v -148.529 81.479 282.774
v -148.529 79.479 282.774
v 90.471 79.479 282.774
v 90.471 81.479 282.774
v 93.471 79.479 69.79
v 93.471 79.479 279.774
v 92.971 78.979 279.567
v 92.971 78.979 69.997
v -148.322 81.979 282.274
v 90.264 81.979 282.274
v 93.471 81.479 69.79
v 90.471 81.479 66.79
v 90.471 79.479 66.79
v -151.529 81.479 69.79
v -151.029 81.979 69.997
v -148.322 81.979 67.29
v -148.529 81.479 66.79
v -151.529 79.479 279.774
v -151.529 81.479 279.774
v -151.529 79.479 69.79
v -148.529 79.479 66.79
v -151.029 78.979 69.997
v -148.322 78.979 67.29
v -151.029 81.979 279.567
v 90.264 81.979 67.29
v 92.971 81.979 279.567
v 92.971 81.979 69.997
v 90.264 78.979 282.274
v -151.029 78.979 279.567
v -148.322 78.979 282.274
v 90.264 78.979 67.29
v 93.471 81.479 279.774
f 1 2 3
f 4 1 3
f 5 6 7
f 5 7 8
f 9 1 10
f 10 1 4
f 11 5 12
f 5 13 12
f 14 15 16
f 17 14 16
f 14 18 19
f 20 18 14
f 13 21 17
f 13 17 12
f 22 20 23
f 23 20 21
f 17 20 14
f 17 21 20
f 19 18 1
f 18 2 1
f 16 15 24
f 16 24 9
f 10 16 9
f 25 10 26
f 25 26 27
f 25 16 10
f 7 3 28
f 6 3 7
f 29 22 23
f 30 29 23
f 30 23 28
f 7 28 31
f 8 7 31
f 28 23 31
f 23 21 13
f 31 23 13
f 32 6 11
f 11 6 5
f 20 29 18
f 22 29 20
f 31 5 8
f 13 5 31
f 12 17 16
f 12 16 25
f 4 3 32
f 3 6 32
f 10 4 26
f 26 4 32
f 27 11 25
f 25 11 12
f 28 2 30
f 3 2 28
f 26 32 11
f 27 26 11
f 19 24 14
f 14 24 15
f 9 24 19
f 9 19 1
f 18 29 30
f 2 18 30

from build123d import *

# Parameters (mm, degrees)
CROQUIS1_W              = 245
CROQUIS1_H              = 215.984697531
SALIENTE_EXTRUIR1_DEPTH = 3
CHAFL_N1_SIZE           = 3
CHAFL_N2_SIZE           = 0.5
CHAFL_N3_SIZE           = 0.5


with BuildPart() as part:
    # Croquis1 → Saliente-Extruir1 (new body)
    with BuildSketch(Plane(origin=(0, 78.978806339, 0), x_dir=(1, 0, 0), z_dir=(0, 1, 0))):
        with Locations((-29.028784153, -174.782074069)):
            Rectangle(CROQUIS1_W, CROQUIS1_H)
    extrude(amount=SALIENTE_EXTRUIR1_DEPTH)

    # Chaflán1
    chafl_n1_edges = [part.edges().sort_by_distance(p)[0] for p in [
        (93.471215847, 80.478806339, 66.789725304),
        (93.471215847, 80.478806339, 282.774422835),
        (-151.528784153, 80.478806339, 282.774422835),
        (-151.528784153, 80.478806339, 66.789725304),
    ]]
    chamfer(chafl_n1_edges, length=CHAFL_N1_SIZE)

    # Chaflán2
    chafl_n2_edges = [part.edges().sort_by_distance(p)[0] for p in [
        (-151.528784153, 81.978806339, 174.78207407),
        (-29.028784153, 81.978806339, 66.789725304),
        (-29.028784153, 81.978806339, 282.774422835),
        (93.471215847, 81.978806339, 174.78207407),
        (91.971215847, 81.978806339, 281.274422835),
        (91.971215847, 81.978806339, 68.289725304),
        (-150.028784153, 81.978806339, 281.274422835),
        (-150.028784153, 81.978806339, 68.289725304),
    ]]
    chamfer(chafl_n2_edges, length=CHAFL_N2_SIZE)

    # Chaflán3
    chafl_n3_edges = [part.edges().sort_by_distance(p)[0] for p in [
        (-151.528784153, 78.978806339, 174.78207407),
        (-29.028784153, 78.978806339, 66.789725304),
        (93.471215847, 78.978806339, 174.78207407),
        (-29.028784153, 78.978806339, 282.774422835),
        (91.971215847, 78.978806339, 281.274422835),
        (91.971215847, 78.978806339, 68.289725304),
        (-150.028784153, 78.978806339, 281.274422835),
        (-150.028784153, 78.978806339, 68.289725304),
    ]]
    chamfer(chafl_n3_edges, length=CHAFL_N3_SIZE)


solid = part.part
